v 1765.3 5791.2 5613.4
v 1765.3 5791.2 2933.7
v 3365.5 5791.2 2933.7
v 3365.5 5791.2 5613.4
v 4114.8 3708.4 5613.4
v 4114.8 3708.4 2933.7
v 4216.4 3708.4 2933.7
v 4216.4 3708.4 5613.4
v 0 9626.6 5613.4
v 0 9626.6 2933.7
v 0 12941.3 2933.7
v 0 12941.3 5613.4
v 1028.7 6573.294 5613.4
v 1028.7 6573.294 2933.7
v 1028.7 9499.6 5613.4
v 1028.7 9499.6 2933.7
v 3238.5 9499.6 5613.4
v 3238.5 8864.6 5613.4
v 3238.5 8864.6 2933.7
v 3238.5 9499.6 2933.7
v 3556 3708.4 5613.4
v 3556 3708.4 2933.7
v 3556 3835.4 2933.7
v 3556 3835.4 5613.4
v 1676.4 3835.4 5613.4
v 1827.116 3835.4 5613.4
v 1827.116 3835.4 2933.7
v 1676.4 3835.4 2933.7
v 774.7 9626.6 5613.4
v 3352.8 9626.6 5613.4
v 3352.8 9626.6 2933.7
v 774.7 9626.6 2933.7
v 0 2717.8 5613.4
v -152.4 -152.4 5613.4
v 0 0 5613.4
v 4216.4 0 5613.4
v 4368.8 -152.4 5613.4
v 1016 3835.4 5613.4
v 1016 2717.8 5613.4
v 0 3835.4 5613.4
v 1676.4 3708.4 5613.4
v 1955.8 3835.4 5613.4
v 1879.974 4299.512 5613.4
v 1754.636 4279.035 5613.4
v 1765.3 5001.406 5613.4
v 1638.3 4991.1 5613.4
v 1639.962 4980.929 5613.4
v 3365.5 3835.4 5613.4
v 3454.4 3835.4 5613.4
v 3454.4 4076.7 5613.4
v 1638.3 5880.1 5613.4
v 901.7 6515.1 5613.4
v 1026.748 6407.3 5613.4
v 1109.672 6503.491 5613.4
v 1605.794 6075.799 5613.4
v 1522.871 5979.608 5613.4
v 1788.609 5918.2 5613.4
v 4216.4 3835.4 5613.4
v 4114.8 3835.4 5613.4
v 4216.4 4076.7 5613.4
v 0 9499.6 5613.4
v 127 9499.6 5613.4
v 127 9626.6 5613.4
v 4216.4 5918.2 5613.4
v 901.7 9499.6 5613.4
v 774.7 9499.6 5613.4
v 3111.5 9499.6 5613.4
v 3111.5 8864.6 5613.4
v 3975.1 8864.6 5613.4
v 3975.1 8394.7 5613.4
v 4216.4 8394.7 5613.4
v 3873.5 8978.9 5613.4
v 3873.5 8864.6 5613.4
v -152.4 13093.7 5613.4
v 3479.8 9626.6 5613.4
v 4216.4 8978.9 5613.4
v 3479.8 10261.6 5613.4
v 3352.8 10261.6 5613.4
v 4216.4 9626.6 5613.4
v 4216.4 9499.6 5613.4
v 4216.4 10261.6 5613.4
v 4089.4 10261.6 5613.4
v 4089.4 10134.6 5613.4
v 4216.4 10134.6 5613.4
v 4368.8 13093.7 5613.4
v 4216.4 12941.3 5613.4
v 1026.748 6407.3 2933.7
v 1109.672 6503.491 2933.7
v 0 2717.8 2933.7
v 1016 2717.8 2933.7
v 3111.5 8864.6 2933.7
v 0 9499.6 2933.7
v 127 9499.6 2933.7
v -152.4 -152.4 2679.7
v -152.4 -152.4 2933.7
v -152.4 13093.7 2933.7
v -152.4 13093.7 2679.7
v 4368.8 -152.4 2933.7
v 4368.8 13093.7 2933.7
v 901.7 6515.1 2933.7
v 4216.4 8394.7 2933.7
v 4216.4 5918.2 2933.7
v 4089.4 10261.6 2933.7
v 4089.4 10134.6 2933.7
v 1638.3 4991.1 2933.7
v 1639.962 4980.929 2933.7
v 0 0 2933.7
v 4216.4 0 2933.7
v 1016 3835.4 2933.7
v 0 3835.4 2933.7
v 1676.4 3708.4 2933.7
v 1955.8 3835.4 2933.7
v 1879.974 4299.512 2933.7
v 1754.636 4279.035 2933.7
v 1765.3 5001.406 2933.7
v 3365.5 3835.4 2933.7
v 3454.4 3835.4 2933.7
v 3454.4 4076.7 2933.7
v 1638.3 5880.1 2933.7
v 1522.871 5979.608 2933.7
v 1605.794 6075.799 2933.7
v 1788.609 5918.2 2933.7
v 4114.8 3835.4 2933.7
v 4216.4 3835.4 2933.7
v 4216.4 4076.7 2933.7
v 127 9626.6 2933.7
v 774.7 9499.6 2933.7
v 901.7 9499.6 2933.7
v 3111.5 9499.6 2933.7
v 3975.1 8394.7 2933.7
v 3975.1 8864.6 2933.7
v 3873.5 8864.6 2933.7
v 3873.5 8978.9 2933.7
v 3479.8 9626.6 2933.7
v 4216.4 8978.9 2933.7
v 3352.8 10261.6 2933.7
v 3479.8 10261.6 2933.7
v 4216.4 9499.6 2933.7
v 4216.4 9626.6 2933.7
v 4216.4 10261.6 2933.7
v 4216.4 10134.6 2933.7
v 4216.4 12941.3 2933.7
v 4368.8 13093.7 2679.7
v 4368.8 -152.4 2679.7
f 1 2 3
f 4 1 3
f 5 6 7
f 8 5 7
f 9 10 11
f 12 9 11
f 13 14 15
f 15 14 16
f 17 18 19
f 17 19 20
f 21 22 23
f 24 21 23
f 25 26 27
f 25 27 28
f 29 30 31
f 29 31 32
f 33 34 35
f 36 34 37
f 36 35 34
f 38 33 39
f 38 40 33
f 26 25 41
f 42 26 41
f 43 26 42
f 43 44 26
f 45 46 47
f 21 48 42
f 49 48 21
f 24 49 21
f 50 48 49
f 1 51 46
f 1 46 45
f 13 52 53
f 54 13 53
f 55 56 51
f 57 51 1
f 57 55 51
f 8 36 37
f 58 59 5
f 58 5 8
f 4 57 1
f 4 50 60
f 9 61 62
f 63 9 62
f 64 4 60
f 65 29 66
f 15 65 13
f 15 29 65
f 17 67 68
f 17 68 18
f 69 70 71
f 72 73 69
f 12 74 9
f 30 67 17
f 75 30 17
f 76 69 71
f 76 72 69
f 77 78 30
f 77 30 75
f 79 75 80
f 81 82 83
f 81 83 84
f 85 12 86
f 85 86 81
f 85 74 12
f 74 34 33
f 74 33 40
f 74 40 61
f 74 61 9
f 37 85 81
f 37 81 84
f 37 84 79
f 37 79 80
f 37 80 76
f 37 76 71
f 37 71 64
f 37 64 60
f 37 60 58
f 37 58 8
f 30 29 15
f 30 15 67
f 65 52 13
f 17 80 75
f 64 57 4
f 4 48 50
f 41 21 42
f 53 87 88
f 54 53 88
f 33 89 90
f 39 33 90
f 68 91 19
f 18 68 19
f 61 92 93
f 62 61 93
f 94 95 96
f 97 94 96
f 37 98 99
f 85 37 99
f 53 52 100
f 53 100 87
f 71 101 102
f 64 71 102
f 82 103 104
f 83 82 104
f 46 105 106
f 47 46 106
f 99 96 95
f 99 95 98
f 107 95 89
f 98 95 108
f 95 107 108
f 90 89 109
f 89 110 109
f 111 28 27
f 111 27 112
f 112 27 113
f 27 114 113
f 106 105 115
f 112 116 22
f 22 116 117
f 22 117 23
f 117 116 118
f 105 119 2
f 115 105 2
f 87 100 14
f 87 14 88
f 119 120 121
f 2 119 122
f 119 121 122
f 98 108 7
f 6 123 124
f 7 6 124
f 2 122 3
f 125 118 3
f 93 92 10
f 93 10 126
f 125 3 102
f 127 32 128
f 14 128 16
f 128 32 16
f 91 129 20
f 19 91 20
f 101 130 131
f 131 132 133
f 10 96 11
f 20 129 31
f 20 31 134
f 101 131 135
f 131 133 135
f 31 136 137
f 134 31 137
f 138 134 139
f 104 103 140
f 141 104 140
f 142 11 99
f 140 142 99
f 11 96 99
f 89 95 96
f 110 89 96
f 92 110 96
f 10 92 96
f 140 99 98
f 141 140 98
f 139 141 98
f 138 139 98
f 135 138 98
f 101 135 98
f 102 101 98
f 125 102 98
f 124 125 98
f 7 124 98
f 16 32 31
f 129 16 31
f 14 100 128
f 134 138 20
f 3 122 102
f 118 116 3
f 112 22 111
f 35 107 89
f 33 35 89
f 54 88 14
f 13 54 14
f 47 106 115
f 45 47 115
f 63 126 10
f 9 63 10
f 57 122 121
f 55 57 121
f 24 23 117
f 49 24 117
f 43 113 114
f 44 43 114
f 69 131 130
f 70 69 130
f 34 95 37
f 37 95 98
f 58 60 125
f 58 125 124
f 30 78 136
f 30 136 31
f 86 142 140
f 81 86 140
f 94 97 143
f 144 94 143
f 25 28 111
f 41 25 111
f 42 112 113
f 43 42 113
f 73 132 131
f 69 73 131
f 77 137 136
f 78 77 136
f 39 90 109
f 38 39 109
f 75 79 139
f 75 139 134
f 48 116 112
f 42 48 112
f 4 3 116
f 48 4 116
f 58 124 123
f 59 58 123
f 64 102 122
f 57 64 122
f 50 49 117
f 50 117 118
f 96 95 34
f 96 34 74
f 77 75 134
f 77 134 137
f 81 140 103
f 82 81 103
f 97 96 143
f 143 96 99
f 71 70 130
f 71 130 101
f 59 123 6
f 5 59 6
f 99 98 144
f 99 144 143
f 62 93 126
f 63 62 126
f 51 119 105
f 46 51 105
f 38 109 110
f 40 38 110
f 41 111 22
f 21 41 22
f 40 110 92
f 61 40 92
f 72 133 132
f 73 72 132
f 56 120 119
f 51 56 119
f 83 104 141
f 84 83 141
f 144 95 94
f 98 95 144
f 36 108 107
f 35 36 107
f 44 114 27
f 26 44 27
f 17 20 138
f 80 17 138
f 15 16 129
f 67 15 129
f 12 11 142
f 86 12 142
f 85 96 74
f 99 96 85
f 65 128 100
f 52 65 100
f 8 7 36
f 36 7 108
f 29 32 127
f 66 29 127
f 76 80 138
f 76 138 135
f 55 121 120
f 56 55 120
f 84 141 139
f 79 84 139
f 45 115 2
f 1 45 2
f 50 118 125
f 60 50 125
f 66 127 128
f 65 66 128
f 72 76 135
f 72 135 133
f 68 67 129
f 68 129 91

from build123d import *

# Parameters (mm, degrees)
F1_W     = 4521.2
F1_H     = 13246.1
F2_DEPTH = 254
F3_DEPTH = 2679.7


# Not quite as in the source:
# - a feature names something its author has since deleted; it is built from what else it names


with BuildPart() as f2:
    # F1 (on offset) → F2 (new body)
    with BuildSketch(Plane.XY.offset(2933.7)):
        with Locations((2108.2, 6470.65)):
            Rectangle(F1_W, F1_H)
        Polygon((4216.4, 0), (0, 0), (0, 2717.8), (1016, 2717.8), (1016, 3835.4), (0, 3835.4), (0, 9499.6), (127, 9499.6), (127, 9626.6), (0, 9626.6), (0, 12941.3), (4216.4, 12941.3), (4216.4, 10261.6), (4089.4, 10261.6), (4089.4, 10134.6), (4216.4, 10134.6), (4216.4, 9626.6), (3479.8, 9626.6), (3479.8, 10261.6), (3352.8, 10261.6), (3352.8, 9626.6), (774.7, 9626.6), (774.7, 9499.6), (901.7, 9499.6), (901.7, 6515.1), (1026.7483846603, 6407.2996683963), (1109.6717166631, 6503.4907335196), (1028.7, 6573.2939375395), (1028.7, 9499.6), (3111.5, 9499.6), (3111.5, 8864.6), (3238.5, 8864.6), (3238.5, 9499.6), (4216.4, 9499.6), (4216.4, 8978.9), (3873.5, 8978.9), (3873.5, 8864.6), (3975.1, 8864.6), (3975.1, 8394.7), (4216.4, 8394.7), (4216.4, 5918.2), (1788.6089675458, 5918.2), (1605.7940538549, 6075.7990635267), (1522.8707218521, 5979.6079984034), (1638.3, 5880.1), (1638.3, 4991.1), (1639.9617752246, 4980.9286603364), (1765.3, 5001.4061946153), (1765.3, 5791.2), (3365.5, 5791.2), (3365.5, 3835.4), (1955.8, 3835.4), (1879.9741919622, 4299.512135873), (1754.6359671868, 4279.034601594), (1827.1161924154, 3835.4), (1676.4, 3835.4), (1676.4, 3708.4), (3556, 3708.4), (3556, 3835.4), (3454.4, 3835.4), (3454.4, 4076.7), (4216.4, 4076.7), (4216.4, 3835.4), (4114.8, 3835.4), (4114.8, 3708.4), (4216.4, 3708.4), align=None, mode=Mode.SUBTRACT)
        Polygon((0, 2717.8), (0, 0), (4216.4, 0), (4216.4, 3708.4), (4114.8, 3708.4), (4114.8, 3835.4), (4216.4, 3835.4), (4216.4, 4076.7), (3454.4, 4076.7), (3454.4, 3835.4), (3556, 3835.4), (3556, 3708.4), (1676.4, 3708.4), (1676.4, 3835.4), (1827.1161924154, 3835.4), (1754.6359671868, 4279.034601594), (1879.9741919622, 4299.512135873), (1955.8, 3835.4), (3365.5, 3835.4), (3365.5, 5791.2), (1765.3, 5791.2), (1765.3, 5001.4061946153), (1639.9617752246, 4980.9286603364), (1638.3, 4991.1), (1638.3, 5880.1), (1522.8707218521, 5979.6079984034), (1605.7940538549, 6075.7990635267), (1788.6089675458, 5918.2), (4216.4, 5918.2), (4216.4, 8394.7), (3975.1, 8394.7), (3975.1, 8864.6), (3873.5, 8864.6), (3873.5, 8978.9), (4216.4, 8978.9), (4216.4, 9499.6), (3238.5, 9499.6), (3238.5, 8864.6), (3111.5, 8864.6), (3111.5, 9499.6), (1028.7, 9499.6), (1028.7, 6573.2939375395), (1109.6717166631, 6503.4907335196), (1026.7483846603, 6407.2996683963), (901.7, 6515.1), (901.7, 9499.6), (774.7, 9499.6), (774.7, 9626.6), (3352.8, 9626.6), (3352.8, 10261.6), (3479.8, 10261.6), (3479.8, 9626.6), (4216.4, 9626.6), (4216.4, 10134.6), (4089.4, 10134.6), (4089.4, 10261.6), (4216.4, 10261.6), (4216.4, 12941.3), (0, 12941.3), (0, 9626.6), (127, 9626.6), (127, 9499.6), (0, 9499.6), (0, 3835.4), (1016, 3835.4), (1016, 2717.8), align=None)
    extrude(amount=-F2_DEPTH)


with BuildPart() as f3:
    # F1 (on offset) → F3 (new body)
    with BuildSketch(Plane.XY.offset(2933.7)):
        with Locations((2108.2, 6470.65)):
            Rectangle(F1_W, F1_H)
        Polygon((4216.4, 0), (0, 0), (0, 2717.8), (1016, 2717.8), (1016, 3835.4), (0, 3835.4), (0, 9499.6), (127, 9499.6), (127, 9626.6), (0, 9626.6), (0, 12941.3), (4216.4, 12941.3), (4216.4, 10261.6), (4089.4, 10261.6), (4089.4, 10134.6), (4216.4, 10134.6), (4216.4, 9626.6), (3479.8, 9626.6), (3479.8, 10261.6), (3352.8, 10261.6), (3352.8, 9626.6), (774.7, 9626.6), (774.7, 9499.6), (901.7, 9499.6), (901.7, 6515.1), (1026.7483846603, 6407.2996683963), (1109.6717166631, 6503.4907335196), (1028.7, 6573.2939375395), (1028.7, 9499.6), (3111.5, 9499.6), (3111.5, 8864.6), (3238.5, 8864.6), (3238.5, 9499.6), (4216.4, 9499.6), (4216.4, 8978.9), (3873.5, 8978.9), (3873.5, 8864.6), (3975.1, 8864.6), (3975.1, 8394.7), (4216.4, 8394.7), (4216.4, 5918.2), (1788.6089675458, 5918.2), (1605.7940538549, 6075.7990635267), (1522.8707218521, 5979.6079984034), (1638.3, 5880.1), (1638.3, 4991.1), (1639.9617752246, 4980.9286603364), (1765.3, 5001.4061946153), (1765.3, 5791.2), (3365.5, 5791.2), (3365.5, 3835.4), (1955.8, 3835.4), (1879.9741919622, 4299.512135873), (1754.6359671868, 4279.034601594), (1827.1161924154, 3835.4), (1676.4, 3835.4), (1676.4, 3708.4), (3556, 3708.4), (3556, 3835.4), (3454.4, 3835.4), (3454.4, 4076.7), (4216.4, 4076.7), (4216.4, 3835.4), (4114.8, 3835.4), (4114.8, 3708.4), (4216.4, 3708.4), align=None, mode=Mode.SUBTRACT)
    extrude(amount=F3_DEPTH)


solid = Compound([f2.part, f3.part])
